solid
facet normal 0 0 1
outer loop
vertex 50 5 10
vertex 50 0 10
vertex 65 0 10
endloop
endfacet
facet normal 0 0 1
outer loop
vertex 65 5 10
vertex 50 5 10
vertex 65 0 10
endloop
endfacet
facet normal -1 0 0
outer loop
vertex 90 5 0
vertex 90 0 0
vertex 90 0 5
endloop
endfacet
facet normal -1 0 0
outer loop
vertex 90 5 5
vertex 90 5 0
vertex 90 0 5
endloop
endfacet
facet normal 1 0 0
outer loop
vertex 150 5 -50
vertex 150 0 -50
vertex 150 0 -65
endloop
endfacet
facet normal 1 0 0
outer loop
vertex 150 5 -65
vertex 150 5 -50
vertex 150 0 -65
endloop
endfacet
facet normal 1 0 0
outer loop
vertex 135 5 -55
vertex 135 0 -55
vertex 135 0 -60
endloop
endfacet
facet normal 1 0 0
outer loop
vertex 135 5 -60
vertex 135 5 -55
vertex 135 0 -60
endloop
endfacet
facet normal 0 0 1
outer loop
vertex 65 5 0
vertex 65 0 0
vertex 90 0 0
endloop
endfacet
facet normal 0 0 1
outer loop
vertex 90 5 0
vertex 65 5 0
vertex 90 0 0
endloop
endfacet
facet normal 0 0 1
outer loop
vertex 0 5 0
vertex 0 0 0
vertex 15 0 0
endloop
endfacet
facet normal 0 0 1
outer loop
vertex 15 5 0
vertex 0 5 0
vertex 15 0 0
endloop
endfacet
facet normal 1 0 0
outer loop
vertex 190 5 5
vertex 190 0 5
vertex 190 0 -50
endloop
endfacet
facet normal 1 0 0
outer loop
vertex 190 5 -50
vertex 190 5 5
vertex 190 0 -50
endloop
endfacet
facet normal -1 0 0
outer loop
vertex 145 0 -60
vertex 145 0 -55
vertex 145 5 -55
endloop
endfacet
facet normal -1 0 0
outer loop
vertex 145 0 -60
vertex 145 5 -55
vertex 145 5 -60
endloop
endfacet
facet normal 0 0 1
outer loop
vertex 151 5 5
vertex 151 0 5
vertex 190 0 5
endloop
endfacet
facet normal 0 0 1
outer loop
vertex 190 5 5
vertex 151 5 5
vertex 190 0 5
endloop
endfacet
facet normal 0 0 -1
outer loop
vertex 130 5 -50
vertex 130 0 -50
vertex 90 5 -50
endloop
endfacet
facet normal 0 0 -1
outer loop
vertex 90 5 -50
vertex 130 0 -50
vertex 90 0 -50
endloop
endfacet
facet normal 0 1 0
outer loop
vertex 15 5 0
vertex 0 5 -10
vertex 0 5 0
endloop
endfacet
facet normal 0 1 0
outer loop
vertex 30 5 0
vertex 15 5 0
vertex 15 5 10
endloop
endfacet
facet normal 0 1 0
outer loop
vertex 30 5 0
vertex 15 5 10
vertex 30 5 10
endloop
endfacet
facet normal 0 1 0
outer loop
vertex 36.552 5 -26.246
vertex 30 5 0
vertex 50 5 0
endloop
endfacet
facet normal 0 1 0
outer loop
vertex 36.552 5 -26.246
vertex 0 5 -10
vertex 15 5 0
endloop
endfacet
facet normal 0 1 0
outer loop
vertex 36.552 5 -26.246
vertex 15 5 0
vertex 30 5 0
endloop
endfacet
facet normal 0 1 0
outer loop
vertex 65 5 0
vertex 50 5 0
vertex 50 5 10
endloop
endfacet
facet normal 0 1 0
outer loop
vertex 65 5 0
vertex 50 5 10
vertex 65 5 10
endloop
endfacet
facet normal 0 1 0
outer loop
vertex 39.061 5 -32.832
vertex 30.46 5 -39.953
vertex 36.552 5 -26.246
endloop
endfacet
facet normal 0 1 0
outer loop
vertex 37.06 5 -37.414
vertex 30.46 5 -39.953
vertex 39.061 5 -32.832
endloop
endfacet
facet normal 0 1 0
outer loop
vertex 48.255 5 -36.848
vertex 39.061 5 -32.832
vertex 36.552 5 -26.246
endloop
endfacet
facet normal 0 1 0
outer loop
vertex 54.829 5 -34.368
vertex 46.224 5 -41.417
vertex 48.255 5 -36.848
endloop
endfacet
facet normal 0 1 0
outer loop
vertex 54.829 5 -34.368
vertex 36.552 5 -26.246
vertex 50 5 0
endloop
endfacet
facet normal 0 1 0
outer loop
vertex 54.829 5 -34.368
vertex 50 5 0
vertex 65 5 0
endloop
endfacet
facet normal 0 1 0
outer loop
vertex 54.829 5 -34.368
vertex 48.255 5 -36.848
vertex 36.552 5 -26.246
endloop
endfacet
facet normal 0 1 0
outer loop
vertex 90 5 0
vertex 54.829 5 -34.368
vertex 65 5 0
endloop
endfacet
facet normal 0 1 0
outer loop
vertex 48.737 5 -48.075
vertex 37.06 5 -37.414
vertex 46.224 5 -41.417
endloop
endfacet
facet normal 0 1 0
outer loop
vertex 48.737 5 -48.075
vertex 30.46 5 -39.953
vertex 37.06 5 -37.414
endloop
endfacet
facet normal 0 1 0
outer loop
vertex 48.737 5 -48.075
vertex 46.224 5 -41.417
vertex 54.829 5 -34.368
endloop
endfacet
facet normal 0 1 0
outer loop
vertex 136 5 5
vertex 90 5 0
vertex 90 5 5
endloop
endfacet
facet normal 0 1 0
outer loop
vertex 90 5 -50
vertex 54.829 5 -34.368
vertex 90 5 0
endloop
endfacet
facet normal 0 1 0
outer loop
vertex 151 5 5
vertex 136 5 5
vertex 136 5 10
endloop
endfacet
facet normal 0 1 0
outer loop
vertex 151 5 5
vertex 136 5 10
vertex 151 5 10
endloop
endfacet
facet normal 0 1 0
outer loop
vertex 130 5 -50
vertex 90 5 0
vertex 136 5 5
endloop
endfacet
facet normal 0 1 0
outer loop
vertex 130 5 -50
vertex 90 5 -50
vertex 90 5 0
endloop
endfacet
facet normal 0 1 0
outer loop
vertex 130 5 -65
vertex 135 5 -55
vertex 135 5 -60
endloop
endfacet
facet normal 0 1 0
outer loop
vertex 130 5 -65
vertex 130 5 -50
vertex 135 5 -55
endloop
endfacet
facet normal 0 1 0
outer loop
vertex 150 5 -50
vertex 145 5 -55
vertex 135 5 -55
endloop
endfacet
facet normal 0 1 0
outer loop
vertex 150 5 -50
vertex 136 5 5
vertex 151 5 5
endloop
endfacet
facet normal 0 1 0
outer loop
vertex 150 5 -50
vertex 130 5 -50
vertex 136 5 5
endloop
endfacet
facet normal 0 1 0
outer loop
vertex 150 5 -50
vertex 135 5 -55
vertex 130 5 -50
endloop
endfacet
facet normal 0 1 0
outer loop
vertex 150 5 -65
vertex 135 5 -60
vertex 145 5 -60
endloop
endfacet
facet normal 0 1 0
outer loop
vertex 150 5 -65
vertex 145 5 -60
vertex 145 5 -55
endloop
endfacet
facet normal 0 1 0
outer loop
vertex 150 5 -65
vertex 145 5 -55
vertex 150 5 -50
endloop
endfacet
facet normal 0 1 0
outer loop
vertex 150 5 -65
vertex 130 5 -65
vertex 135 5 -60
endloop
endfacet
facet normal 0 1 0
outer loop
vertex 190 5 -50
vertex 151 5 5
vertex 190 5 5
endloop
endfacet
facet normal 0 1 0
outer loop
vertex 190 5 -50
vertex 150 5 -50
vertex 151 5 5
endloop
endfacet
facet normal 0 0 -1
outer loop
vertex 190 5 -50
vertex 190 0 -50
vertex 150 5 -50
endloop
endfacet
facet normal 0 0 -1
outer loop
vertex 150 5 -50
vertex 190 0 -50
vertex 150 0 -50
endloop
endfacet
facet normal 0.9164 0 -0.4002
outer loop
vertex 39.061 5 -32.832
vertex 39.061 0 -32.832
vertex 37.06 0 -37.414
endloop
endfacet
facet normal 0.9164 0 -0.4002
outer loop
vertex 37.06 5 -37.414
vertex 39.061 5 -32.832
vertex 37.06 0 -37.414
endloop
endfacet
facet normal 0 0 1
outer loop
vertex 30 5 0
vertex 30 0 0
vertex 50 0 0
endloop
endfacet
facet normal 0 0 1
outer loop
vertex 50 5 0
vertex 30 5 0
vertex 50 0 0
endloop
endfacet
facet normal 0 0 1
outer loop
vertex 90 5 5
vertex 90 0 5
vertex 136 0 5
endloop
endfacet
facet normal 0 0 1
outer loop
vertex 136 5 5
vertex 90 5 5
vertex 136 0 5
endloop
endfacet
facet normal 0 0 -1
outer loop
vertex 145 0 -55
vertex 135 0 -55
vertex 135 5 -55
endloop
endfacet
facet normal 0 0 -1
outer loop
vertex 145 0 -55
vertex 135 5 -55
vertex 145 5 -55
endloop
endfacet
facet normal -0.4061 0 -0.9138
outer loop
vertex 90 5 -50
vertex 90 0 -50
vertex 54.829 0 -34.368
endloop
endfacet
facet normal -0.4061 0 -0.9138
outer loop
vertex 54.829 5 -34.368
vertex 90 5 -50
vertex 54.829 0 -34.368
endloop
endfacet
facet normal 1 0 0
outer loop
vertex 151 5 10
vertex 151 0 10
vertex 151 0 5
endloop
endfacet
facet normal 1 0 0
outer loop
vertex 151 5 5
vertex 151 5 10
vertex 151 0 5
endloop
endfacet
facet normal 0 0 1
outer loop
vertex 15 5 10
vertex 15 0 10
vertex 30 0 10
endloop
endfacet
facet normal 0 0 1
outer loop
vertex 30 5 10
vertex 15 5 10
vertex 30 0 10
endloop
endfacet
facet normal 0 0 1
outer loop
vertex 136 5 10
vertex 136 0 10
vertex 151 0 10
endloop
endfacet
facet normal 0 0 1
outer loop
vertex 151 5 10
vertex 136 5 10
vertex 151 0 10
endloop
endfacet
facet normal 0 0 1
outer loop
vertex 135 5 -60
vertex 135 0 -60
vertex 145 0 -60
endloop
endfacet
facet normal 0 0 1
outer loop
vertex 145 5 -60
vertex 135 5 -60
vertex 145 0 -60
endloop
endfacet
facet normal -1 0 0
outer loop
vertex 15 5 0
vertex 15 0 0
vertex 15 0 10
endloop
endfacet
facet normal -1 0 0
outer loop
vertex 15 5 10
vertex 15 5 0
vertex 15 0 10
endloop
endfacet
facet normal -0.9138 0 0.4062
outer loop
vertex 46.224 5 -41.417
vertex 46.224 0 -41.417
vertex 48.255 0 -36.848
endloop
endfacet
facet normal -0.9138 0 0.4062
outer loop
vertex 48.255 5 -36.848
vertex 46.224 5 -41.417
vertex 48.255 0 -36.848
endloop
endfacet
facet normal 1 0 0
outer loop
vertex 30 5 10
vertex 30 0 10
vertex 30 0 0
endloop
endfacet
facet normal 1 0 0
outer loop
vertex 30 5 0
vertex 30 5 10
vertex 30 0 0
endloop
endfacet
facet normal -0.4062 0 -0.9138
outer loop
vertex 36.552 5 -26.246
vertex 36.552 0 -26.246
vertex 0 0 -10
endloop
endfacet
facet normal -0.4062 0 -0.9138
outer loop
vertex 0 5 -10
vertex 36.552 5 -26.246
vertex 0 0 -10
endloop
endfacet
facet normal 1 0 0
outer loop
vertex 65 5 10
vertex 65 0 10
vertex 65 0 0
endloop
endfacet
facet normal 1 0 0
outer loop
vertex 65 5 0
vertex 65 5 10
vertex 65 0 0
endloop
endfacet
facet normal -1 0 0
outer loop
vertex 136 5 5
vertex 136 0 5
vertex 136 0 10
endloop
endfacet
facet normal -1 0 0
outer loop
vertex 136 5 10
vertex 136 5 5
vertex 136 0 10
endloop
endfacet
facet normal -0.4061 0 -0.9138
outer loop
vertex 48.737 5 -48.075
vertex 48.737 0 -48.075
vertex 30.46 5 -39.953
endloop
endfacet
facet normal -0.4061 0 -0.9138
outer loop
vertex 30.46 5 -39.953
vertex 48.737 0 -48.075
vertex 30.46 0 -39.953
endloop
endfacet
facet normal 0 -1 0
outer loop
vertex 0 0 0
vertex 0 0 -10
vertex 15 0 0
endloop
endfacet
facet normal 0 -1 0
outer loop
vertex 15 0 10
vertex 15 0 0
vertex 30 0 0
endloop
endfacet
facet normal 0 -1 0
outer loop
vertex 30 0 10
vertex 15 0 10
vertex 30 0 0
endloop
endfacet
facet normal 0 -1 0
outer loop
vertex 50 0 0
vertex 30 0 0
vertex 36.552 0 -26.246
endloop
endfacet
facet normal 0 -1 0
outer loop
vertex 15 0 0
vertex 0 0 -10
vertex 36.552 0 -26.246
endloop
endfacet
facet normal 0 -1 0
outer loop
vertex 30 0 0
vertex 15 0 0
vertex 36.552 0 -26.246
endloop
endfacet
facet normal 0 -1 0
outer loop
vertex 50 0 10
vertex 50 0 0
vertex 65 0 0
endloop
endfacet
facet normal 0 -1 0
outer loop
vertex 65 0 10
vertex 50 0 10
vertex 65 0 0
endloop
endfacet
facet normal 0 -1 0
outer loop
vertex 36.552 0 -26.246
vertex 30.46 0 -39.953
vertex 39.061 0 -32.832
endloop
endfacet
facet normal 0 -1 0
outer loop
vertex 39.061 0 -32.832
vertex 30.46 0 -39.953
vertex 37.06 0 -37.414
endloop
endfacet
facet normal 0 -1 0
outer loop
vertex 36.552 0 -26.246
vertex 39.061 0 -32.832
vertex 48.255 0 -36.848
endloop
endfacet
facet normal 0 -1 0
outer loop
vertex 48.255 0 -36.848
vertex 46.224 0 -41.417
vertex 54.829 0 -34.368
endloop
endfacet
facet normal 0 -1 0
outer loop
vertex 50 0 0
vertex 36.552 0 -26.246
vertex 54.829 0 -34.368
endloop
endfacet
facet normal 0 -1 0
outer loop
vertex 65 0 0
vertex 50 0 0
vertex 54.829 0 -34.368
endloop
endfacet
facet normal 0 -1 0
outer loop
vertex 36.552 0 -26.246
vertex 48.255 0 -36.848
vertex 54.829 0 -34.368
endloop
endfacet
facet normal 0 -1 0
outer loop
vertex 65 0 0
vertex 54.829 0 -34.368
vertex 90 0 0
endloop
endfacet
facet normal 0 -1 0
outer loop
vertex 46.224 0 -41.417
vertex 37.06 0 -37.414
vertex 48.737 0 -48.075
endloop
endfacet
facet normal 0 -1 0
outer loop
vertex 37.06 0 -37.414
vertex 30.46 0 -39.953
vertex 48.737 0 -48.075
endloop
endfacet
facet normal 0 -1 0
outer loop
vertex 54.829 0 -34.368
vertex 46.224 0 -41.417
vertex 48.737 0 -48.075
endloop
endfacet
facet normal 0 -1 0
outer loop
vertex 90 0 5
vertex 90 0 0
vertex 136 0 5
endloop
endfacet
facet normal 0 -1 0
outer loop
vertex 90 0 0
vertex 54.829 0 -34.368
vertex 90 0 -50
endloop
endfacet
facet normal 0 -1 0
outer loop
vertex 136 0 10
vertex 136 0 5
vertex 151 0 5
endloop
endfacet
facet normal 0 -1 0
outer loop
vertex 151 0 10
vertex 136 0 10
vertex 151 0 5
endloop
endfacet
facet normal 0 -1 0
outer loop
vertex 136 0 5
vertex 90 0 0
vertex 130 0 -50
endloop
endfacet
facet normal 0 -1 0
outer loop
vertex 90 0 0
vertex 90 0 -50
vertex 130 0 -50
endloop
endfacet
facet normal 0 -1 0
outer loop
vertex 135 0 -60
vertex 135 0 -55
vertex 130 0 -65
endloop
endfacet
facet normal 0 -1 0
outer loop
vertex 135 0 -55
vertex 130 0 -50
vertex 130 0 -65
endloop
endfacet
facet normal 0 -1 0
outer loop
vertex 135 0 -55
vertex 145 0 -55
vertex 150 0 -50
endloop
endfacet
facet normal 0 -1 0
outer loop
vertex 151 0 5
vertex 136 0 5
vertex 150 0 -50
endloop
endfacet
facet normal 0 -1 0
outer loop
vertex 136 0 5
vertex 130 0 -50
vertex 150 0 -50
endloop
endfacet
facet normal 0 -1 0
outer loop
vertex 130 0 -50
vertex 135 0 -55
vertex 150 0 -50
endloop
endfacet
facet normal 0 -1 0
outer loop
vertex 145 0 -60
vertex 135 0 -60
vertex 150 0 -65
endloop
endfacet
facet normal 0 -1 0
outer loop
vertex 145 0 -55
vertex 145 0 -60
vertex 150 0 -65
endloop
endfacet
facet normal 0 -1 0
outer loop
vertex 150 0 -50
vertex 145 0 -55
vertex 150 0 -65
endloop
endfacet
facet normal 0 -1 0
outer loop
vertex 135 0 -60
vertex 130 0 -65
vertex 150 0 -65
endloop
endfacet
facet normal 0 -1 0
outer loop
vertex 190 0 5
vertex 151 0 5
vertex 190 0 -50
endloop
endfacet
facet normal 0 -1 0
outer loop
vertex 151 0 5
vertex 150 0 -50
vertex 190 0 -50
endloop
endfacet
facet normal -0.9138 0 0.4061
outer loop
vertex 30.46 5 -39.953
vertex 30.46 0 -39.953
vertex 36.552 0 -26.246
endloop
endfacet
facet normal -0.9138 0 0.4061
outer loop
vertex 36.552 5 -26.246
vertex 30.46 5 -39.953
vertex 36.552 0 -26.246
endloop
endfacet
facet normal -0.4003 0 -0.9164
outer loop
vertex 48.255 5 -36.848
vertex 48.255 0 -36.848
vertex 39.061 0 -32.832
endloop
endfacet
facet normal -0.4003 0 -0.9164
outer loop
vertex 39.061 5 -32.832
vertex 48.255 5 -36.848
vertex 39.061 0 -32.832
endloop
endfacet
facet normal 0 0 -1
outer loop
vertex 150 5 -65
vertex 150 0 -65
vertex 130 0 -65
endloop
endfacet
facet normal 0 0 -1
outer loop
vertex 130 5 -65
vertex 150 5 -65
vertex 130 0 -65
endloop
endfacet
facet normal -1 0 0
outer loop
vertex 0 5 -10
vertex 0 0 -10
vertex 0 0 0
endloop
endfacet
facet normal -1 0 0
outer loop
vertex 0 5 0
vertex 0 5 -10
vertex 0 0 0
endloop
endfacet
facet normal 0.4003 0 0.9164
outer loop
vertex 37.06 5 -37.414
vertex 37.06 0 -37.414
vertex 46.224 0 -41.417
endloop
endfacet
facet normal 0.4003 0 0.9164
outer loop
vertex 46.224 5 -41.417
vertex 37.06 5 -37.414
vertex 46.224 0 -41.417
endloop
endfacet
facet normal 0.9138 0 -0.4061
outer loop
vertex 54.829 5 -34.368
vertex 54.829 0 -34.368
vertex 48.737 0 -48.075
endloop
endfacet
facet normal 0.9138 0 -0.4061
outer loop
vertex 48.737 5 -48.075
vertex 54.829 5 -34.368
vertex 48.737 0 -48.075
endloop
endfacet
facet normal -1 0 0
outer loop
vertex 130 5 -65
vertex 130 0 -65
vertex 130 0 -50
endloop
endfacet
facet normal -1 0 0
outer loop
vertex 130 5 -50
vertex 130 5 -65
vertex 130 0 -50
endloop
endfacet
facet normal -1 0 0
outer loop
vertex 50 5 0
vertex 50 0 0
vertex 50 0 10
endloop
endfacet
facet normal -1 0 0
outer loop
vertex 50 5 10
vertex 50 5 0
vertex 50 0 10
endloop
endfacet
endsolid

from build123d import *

# Parameters (mm, degrees)
SKETCH1_W           = 10
SKETCH1_H           = 5
BOSS_EXTRUDE1_DEPTH = 5


with BuildPart() as part:
    # Sketch1 → Boss-Extrude1 (new body)
    with BuildSketch(Plane(origin=(0, 0, 0), x_dir=(1, 0, 0), z_dir=(0, 1, 0))):
        Polygon((0, 0), (15, 0), (15, -10), (30, -10), (30, 0), (50, 0), (50, -10), (65, -10), (65, 0), (90, 0), (90, -5), (136, -5), (136, -10), (151, -10), (151, -5), (190, -5), (190, 50), (150, 50), (150, 65), (130, 65), (130, 50), (90, 50), (54.828692917, 34.368307963), (48.736615926, 48.075481193), (30.460384954, 39.952711871), (36.552461945, 26.245538642), (0, 10), align=None)
        Polygon((39.061482867, 32.832359245), (37.060135027, 37.414346459), (46.224109455, 41.417042137), (48.254801785, 36.847984394), align=None, mode=Mode.SUBTRACT)
        with Locations((140, 57.5)):
            Rectangle(SKETCH1_W, SKETCH1_H, mode=Mode.SUBTRACT)
    extrude(amount=BOSS_EXTRUDE1_DEPTH)


solid = part.part
